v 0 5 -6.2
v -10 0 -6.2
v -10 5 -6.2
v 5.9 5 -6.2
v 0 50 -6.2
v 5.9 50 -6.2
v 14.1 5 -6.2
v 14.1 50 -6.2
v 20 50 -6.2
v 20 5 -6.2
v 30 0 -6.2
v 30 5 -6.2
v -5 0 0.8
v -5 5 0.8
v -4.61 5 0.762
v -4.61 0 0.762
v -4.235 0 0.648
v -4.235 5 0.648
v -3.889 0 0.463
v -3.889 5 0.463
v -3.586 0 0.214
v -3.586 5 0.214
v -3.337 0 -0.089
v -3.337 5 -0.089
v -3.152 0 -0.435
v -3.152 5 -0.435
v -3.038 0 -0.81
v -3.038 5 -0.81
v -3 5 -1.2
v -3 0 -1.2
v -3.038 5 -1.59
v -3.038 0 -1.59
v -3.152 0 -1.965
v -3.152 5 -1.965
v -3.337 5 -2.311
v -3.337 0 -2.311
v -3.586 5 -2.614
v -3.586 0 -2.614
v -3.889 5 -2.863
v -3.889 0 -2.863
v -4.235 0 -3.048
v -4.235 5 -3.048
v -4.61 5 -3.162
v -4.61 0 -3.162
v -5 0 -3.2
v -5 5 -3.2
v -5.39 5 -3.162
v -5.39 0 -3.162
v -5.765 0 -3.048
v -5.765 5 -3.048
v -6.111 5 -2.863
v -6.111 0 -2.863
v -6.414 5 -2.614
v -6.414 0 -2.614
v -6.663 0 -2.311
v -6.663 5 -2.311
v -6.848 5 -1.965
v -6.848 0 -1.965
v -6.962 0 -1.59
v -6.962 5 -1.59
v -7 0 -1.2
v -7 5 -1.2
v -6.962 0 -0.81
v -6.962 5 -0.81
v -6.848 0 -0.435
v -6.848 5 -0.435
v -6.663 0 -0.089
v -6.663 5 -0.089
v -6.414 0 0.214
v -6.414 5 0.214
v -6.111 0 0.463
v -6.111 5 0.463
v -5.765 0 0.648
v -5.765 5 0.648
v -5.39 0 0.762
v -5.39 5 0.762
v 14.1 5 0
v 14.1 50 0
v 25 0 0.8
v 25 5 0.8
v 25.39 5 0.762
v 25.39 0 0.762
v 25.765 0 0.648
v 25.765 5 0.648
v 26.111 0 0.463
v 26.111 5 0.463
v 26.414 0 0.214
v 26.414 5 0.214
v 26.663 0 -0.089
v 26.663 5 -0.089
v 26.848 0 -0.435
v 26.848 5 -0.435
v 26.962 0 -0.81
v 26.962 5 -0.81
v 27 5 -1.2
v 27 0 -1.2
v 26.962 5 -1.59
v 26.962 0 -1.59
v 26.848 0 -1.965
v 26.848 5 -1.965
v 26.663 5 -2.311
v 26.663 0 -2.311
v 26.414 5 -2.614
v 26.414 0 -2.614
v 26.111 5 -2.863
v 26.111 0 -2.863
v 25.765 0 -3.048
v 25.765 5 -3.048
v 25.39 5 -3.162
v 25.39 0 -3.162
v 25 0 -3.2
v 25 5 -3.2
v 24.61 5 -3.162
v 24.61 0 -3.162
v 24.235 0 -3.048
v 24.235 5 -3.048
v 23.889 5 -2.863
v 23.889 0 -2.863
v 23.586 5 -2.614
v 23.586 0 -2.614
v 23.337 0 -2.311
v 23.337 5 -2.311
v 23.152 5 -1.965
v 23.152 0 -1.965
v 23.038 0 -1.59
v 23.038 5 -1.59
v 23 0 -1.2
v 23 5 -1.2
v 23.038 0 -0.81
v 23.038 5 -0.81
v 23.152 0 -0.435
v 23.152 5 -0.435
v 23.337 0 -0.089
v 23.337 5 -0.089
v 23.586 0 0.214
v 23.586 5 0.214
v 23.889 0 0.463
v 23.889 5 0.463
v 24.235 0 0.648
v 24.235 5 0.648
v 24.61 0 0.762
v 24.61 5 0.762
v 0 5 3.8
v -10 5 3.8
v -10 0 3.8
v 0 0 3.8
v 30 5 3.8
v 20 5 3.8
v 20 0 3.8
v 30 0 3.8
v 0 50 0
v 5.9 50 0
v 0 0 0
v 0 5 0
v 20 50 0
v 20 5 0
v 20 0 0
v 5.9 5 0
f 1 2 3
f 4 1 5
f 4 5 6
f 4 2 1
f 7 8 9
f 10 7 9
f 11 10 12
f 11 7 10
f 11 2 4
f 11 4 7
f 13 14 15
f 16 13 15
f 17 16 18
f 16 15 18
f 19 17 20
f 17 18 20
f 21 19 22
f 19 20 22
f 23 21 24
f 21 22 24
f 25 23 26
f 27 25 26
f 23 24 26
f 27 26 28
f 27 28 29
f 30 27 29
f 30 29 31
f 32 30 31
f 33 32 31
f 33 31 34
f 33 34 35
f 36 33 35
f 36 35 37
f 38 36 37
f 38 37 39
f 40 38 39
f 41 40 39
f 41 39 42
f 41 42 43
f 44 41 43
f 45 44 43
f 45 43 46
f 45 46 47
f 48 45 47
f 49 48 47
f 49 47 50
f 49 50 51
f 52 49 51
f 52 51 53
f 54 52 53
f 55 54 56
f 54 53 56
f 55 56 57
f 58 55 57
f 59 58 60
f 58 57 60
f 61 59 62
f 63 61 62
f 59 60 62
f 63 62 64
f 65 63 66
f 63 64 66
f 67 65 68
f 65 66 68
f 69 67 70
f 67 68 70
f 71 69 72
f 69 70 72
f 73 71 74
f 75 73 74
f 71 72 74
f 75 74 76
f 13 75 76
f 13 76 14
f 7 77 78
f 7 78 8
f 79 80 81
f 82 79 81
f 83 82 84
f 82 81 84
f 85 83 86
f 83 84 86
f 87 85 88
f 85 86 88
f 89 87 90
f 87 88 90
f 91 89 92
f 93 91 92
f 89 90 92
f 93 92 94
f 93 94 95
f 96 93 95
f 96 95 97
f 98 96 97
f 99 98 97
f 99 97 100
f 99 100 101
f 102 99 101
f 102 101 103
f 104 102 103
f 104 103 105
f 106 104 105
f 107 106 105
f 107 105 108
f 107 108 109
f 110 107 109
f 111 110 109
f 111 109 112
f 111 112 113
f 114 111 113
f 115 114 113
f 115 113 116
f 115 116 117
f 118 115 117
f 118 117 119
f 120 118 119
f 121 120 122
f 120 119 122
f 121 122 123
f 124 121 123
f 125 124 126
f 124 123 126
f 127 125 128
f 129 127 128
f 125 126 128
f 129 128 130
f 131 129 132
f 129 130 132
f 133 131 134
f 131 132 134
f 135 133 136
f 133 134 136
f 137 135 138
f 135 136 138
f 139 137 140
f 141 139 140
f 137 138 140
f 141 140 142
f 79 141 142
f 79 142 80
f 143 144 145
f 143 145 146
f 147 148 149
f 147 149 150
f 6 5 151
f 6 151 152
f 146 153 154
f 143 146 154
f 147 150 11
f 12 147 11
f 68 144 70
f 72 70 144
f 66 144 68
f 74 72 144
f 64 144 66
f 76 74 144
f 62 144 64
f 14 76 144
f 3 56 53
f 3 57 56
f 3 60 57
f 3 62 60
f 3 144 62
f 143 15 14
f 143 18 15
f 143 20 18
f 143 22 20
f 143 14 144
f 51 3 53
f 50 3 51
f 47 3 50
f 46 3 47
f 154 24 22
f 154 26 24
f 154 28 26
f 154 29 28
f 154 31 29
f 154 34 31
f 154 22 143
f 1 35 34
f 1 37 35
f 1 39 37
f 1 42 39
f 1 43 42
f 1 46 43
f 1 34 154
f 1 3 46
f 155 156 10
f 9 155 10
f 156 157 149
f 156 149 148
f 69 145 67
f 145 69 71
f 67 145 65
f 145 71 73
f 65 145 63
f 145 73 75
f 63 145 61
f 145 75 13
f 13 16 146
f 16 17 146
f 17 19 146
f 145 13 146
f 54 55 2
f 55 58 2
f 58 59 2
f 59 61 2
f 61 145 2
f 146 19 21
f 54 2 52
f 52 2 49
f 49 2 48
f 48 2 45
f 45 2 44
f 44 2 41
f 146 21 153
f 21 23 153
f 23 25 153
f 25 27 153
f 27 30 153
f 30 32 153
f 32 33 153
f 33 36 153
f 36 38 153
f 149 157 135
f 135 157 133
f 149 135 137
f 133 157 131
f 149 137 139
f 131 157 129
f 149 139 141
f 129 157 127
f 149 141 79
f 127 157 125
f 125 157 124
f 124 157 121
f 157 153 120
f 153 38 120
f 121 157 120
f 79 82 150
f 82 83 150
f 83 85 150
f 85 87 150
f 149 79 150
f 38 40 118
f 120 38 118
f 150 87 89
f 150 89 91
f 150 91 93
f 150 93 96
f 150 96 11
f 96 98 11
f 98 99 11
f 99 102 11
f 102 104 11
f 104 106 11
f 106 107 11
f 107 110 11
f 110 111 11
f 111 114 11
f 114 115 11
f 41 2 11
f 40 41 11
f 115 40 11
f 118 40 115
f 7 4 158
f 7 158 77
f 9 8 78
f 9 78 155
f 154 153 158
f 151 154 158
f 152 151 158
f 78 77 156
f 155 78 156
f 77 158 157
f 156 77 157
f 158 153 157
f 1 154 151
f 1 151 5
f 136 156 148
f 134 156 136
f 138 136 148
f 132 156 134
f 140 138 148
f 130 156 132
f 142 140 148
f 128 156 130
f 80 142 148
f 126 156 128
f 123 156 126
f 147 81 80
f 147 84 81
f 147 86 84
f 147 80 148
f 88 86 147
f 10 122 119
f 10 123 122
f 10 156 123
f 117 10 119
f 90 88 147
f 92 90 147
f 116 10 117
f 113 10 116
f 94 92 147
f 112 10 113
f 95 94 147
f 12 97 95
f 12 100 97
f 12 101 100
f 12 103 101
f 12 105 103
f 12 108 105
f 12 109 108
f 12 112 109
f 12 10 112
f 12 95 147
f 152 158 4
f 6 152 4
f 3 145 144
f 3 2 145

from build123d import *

# Parameters (mm, degrees)
SKETCH_2_W          = 5.9
SKETCH_2_H          = 6.2
EXTRUDE_1_DEPTH     = 50
EXTRUDE_1_2_DEPTH   = 50
SKETCH_3_W          = 40
SKETCH_3_H          = 6.2
EXTRUDE_2_DEPTH     = 5
SKETCH_4_W          = 10
SKETCH_4_H          = 5
EXTRUDE_3_DEPTH     = 3.8
CUT_EXTRUDE_4_REACH = 56.437
SKETCH_5_R          = 2


with BuildPart() as part:
    # Эскиз2 → Вытянуть1 (new body)
    with BuildSketch(Plane(origin=(0, 0, 0), x_dir=(1, 0, 0), z_dir=(0, 1, 0))):
        with Locations((2.95, 3.1)):
            Rectangle(SKETCH_2_W, SKETCH_2_H)
    extrude(amount=EXTRUDE_1_DEPTH)



with BuildPart() as body_2:
    # Эскиз2 → Extrude 1 2 (new body)
    with BuildSketch(Plane(origin=(0, 0, 0), x_dir=(1, 0, 0), z_dir=(0, 1, 0))):
        with Locations((17.05, 3.1)):
            Rectangle(SKETCH_2_W, SKETCH_2_H)
    extrude(amount=EXTRUDE_1_2_DEPTH)


with BuildPart() as part_1:
    add(part.part)

    add(body_2.part)  # Вытянуть2 merges body 2
    # Эскиз3 → Вытянуть2 (add)
    with BuildSketch(Plane(origin=(0, 0, 0), x_dir=(1, 0, 0), z_dir=(0, 1, 0))):
        with Locations((10, 3.1)):
            Rectangle(SKETCH_3_W, SKETCH_3_H)
    extrude(amount=EXTRUDE_2_DEPTH)

    # Эскиз4 → Вытянуть3 (add)
    with BuildSketch(Plane.XY):
        with Locations((-5, 2.5)):
            Rectangle(SKETCH_4_W, SKETCH_4_H)
        with Locations((25, 2.5)):
            Rectangle(SKETCH_4_W, SKETCH_4_H)
    extrude(amount=EXTRUDE_3_DEPTH)

    # Эскиз5 → Вытянуть4 (cut, up to next)
    with BuildSketch(Plane(origin=(0, 5, 0), x_dir=(1, 0, 0), z_dir=(0, 1, 0)), mode=Mode.PRIVATE) as cut_extrude_4_sk1:
        with Locations(Location((25, 1.2, 0), (0, 0, 270))):
            Circle(SKETCH_5_R)
    cut_extrude_4_tool1 = extrude(cut_extrude_4_sk1.sketch, amount=-CUT_EXTRUDE_4_REACH, mode=Mode.PRIVATE) & part_1.part
    # Эскиз5 → Вытянуть4 (cut, up to next)
    with BuildSketch(Plane(origin=(0, 5, 0), x_dir=(1, 0, 0), z_dir=(0, 1, 0)), mode=Mode.PRIVATE) as cut_extrude_4_sk2:
        with Locations(Location((-5, 1.2, 0), (0, 0, 270))):
            Circle(SKETCH_5_R)
    cut_extrude_4_tool2 = extrude(cut_extrude_4_sk2.sketch, amount=-CUT_EXTRUDE_4_REACH, mode=Mode.PRIVATE) & part_1.part
    add(cut_extrude_4_tool1.solids().sort_by_distance((25, 5, -1.2))[0], mode=Mode.SUBTRACT)
    add(cut_extrude_4_tool2.solids().sort_by_distance((-5, 5, -1.2))[0], mode=Mode.SUBTRACT)


solid = part_1.part
